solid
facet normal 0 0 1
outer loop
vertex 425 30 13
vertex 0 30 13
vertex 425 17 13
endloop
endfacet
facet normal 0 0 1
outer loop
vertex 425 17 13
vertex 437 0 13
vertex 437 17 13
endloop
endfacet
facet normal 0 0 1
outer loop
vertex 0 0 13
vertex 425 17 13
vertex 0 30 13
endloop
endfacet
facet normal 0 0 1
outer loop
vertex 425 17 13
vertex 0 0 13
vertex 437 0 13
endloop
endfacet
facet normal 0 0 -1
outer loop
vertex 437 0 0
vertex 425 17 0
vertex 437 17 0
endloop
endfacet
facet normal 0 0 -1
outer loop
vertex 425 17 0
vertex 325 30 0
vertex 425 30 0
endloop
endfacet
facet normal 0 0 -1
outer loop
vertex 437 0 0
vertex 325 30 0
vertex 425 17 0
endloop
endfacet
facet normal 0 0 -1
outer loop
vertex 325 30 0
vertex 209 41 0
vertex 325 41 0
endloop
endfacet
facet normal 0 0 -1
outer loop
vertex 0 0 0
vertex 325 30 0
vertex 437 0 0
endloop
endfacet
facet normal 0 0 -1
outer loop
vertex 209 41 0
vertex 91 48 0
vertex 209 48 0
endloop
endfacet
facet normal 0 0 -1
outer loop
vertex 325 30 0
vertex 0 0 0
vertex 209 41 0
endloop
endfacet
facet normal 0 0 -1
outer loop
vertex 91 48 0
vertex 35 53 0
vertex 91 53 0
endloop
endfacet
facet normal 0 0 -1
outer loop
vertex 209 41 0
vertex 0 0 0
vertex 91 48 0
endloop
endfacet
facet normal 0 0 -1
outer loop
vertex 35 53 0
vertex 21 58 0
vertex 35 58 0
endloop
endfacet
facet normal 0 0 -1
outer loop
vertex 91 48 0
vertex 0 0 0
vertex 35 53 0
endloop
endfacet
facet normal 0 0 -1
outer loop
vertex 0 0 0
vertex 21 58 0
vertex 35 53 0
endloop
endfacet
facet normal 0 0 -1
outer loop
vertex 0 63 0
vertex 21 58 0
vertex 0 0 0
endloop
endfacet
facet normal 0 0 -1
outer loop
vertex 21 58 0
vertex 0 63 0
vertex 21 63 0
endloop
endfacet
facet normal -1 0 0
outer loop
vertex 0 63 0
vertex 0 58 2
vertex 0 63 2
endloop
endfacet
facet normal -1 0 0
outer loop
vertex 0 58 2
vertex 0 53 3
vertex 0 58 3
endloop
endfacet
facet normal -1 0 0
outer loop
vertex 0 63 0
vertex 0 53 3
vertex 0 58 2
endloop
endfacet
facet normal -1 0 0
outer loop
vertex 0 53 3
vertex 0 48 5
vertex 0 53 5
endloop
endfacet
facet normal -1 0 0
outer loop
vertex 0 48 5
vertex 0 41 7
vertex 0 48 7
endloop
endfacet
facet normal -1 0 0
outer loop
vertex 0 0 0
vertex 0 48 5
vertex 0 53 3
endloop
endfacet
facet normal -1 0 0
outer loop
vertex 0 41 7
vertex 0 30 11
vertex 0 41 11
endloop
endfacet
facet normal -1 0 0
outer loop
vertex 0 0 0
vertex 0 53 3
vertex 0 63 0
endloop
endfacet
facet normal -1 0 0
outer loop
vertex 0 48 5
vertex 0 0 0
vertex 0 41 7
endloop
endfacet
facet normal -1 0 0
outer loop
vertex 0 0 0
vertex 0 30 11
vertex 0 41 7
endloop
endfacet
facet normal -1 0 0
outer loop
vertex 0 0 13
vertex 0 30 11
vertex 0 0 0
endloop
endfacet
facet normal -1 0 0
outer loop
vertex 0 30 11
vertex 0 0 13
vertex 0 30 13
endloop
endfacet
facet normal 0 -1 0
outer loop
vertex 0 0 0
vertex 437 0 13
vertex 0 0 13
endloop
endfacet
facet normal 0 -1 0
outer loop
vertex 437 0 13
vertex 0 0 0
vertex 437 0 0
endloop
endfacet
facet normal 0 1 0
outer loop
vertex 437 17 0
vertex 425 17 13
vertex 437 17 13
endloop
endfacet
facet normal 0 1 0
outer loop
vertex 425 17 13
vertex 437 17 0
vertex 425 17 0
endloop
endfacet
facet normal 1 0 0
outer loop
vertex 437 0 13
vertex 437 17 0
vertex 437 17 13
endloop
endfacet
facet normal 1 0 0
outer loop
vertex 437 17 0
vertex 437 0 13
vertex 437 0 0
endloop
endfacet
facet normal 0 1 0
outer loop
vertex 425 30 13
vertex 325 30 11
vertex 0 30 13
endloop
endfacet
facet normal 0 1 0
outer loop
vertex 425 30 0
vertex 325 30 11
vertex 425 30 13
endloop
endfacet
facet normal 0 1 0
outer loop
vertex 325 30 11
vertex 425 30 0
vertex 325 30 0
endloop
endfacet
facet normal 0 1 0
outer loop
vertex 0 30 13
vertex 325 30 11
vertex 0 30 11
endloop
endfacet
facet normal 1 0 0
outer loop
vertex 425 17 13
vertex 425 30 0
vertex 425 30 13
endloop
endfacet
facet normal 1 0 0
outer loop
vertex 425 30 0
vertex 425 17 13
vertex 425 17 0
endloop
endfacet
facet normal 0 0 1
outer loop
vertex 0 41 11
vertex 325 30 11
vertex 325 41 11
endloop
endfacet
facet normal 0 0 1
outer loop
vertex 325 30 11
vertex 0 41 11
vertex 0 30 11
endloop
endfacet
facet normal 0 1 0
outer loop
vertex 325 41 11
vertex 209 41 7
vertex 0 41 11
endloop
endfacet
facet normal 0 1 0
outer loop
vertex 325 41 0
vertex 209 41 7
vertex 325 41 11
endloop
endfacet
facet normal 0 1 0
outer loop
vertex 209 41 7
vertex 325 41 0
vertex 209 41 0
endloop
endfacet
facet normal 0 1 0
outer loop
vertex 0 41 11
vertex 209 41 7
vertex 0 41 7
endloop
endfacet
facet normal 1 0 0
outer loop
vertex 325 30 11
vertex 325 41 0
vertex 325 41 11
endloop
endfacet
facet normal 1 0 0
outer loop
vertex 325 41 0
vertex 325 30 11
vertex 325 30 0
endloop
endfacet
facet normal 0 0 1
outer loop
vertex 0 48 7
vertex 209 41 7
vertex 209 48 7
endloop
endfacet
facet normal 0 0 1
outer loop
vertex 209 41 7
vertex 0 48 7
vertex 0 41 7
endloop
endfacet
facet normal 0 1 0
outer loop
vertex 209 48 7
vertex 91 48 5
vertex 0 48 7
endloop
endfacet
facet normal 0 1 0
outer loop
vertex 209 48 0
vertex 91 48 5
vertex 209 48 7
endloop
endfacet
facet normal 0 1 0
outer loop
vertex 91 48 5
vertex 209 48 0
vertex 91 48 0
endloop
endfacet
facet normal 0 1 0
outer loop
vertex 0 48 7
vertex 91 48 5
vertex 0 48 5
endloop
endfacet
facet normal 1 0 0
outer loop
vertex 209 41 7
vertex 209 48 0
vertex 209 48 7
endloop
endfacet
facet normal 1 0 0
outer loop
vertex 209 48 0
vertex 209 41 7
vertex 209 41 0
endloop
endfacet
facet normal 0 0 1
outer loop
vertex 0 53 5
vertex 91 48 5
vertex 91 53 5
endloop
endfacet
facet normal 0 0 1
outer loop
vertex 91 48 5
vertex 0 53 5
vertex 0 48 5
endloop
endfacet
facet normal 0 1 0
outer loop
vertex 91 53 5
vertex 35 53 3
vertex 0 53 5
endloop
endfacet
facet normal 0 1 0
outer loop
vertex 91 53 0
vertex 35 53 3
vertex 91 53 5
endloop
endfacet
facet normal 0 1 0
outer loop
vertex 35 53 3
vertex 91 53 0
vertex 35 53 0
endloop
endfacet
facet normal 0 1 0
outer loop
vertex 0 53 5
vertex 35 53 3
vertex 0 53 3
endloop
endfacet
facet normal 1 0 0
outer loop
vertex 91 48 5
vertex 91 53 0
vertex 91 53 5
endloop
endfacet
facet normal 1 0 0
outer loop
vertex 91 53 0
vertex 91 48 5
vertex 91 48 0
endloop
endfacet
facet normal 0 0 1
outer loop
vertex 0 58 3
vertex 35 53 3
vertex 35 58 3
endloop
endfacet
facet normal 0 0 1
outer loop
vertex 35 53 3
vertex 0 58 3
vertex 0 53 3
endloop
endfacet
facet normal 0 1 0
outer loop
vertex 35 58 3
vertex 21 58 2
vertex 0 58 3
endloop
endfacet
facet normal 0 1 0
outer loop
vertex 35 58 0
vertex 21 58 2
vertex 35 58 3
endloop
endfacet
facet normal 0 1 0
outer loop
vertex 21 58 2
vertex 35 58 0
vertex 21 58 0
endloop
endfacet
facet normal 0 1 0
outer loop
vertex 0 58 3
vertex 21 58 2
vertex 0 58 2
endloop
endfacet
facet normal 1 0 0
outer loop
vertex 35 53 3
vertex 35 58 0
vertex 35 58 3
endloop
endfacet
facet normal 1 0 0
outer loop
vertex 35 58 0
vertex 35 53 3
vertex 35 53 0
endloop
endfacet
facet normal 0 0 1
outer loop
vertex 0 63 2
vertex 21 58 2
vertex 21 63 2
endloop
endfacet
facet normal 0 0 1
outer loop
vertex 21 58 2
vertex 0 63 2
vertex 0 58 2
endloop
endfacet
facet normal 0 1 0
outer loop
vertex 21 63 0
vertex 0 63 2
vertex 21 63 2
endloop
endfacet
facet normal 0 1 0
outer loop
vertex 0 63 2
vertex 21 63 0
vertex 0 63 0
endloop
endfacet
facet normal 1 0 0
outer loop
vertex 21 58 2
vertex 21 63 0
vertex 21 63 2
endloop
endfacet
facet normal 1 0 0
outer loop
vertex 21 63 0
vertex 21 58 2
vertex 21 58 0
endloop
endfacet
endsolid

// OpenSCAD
translate([9.5, 8.5, 6.5]) color([0.2870883399952252, 0.829940686628406, 0.0555270458896614]) cube([19, 17, 13], center=true);
translate([28.5, 8.5, 6.5]) color([0.035933833430188966, 0.4178660447962945, 0.49183095909626395]) cube([19, 17, 13], center=true);
translate([47.5, 8.5, 6.5]) color([0.8633251831082008, 0.7171887463451895, 0.6735438085995347]) cube([19, 17, 13], center=true);
translate([66.5, 8.5, 6.5]) color([0.15137377239978678, 0.9867059242186832, 0.41114019628748133]) cube([19, 17, 13], center=true);
translate([85.5, 8.5, 6.5]) color([0.6117708643248599, 0.38668300553323576, 0.04703291581184044]) cube([19, 17, 13], center=true);
translate([104.5, 8.5, 6.5]) color([0.4708892090480652, 0.15136775389483625, 0.03246546237394399]) cube([19, 17, 13], center=true);
translate([123.5, 8.5, 6.5]) color([0.6174004236810055, 0.6299662912183356, 0.10529282465636491]) cube([19, 17, 13], center=true);
translate([142.5, 8.5, 6.5]) color([0.5491437662317772, 0.3466679766399683, 0.3834140731648874]) cube([19, 17, 13], center=true);
translate([161.5, 8.5, 6.5]) color([0.7764198986996783, 0.49031967752424566, 0.8812766154122413]) cube([19, 17, 13], center=true);
translate([180.5, 8.5, 6.5]) color([0.6101197429062234, 0.4671884150380703, 0.6323126400553846]) cube([19, 17, 13], center=true);
translate([199.5, 8.5, 6.5]) color([0.3378653798287524, 0.12432379252825243, 0.6825296186925238]) cube([19, 17, 13], center=true);
translate([218.5, 8.5, 6.5]) color([0.622037442746657, 0.7885664913738635, 0.1271091249471088]) cube([19, 17, 13], center=true);
translate([237.5, 8.5, 6.5]) color([0.9117833181295222, 0.799341211421814, 0.9168874080910093]) cube([19, 17, 13], center=true);
translate([256.5, 8.5, 6.5]) color([0.8725347217734669, 0.681006446357057, 0.8102508494373589]) cube([19, 17, 13], center=true);
translate([275.5, 8.5, 6.5]) color([0.5190073092314018, 0.7854891493606652, 0.18912746785718504]) cube([19, 17, 13], center=true);
translate([294.5, 8.5, 6.5]) color([0.7821141063572942, 0.44457960405634067, 0.756616221297365]) cube([19, 17, 13], center=true);
translate([313.5, 8.5, 6.5]) color([0.4554702368121878, 0.7895587282777832, 0.07533958521856021]) cube([19, 17, 13], center=true);
translate([332.5, 8.5, 6.5]) color([0.04464090542441246, 0.9342895823715677, 0.4861651007487351]) cube([19, 17, 13], center=true);
translate([351.5, 8.5, 6.5]) color([0.9010713996489047, 0.9447832518820701, 0.6665111524556335]) cube([19, 17, 13], center=true);
translate([370.5, 8.5, 6.5]) color([0.5717968260934746, 0.21597938410680917, 0.09347621929900818]) cube([19, 17, 13], center=true);
translate([389.5, 8.5, 6.5]) color([0.8193942150822732, 0.8887720676319878, 0.7793957106948857]) cube([19, 17, 13], center=true);
translate([408.5, 8.5, 6.5]) color([0.6985024327316249, 0.42011111607482077, 0.3053115900269564]) cube([19, 17, 13], center=true);
translate([427.5, 8.5, 6.5]) color([0.11344489563770899, 0.425970248072163, 0.5660129742477574]) cube([19, 17, 13], center=true);
translate([8.5, 23.5, 6.5]) color([0.9228805831375125, 0.9357547693309531, 0.41564119654091314]) cube([17, 13, 13], center=true);
translate([25.5, 23.5, 6.5]) color([0.0992109880980957, 0.7738187324714434, 0.7342793416571158]) cube([17, 13, 13], center=true);
translate([42.5, 23.5, 6.5]) color([0.03070084595190614, 0.4467185991338365, 0.6864181042985581]) cube([17, 13, 13], center=true);
translate([59.5, 23.5, 6.5]) color([0.030134234552269934, 0.9192823534016137, 0.9622424865104192]) cube([17, 13, 13], center=true);
translate([76.5, 23.5, 6.5]) color([0.72254277208884, 0.0785385396518038, 0.07032946587635569]) cube([17, 13, 13], center=true);
translate([93.5, 23.5, 6.5]) color([0.3592533148212369, 0.029377507756986443, 0.3478777272843395]) cube([17, 13, 13], center=true);
translate([110.5, 23.5, 6.5]) color([0.009964241312966027, 0.9743235128409679, 0.8190066990688627]) cube([17, 13, 13], center=true);
translate([127.5, 23.5, 6.5]) color([0.07051761147818736, 0.8934350918478603, 0.20797804000401565]) cube([17, 13, 13], center=true);
translate([144.5, 23.5, 6.5]) color([0.20479079826934998, 0.6737591455288341, 0.9382622681625481]) cube([17, 13, 13], center=true);
translate([161.5, 23.5, 6.5]) color([0.12318812122923739, 0.007184567252270457, 0.3691301471700257]) cube([17, 13, 13], center=true);
translate([178.5, 23.5, 6.5]) color([0.024650014436155776, 0.6048482375805311, 0.8591756086192088]) cube([17, 13, 13], center=true);
translate([195.5, 23.5, 6.5]) color([0.1869917024228578, 0.11239103583018406, 0.34444960733861085]) cube([17, 13, 13], center=true);
translate([212.5, 23.5, 6.5]) color([0.9591715206073138, 0.13015769442868408, 0.9665192604669938]) cube([17, 13, 13], center=true);
translate([229.5, 23.5, 6.5]) color([0.36223986994484925, 0.47337040276011155, 0.29263198596497353]) cube([17, 13, 13], center=true);
translate([246.5, 23.5, 6.5]) color([0.9371268442154698, 0.9581478949874975, 0.6359157065077434]) cube([17, 13, 13], center=true);
translate([263.5, 23.5, 6.5]) color([0.18404555017515556, 0.9929517886102871, 0.10258043954691198]) cube([17, 13, 13], center=true);
translate([280.5, 23.5, 6.5]) color([0.5808493815940804, 0.15640306008300875, 0.8976753141502056]) cube([17, 13, 13], center=true);
translate([297.5, 23.5, 6.5]) color([0.9456783914956152, 0.8043902980001079, 0.3158914186681244]) cube([17, 13, 13], center=true);
translate([314.5, 23.5, 6.5]) color([0.2428386899579852, 0.7548584132190378, 0.291059519145354]) cube([17, 13, 13], center=true);
translate([331.5, 23.5, 6.5]) color([0.4197853778540753, 0.04625567690264132, 0.13223381043380655]) cube([17, 13, 13], center=true);
translate([348.5, 23.5, 6.5]) color([0.020549620641776678, 0.0779211200935358, 0.07321114936486084]) cube([17, 13, 13], center=true);
translate([365.5, 23.5, 6.5]) color([0.42023170217414685, 0.5507771776374378, 0.740878819870922]) cube([17, 13, 13], center=true);
translate([382.5, 23.5, 6.5]) color([0.14228347384241602, 0.4221887461694188, 0.6369660374117204]) cube([17, 13, 13], center=true);
translate([399.5, 23.5, 6.5]) color([0.08455569481893255, 0.44481115514620384, 0.3692560392397978]) cube([17, 13, 13], center=true);
translate([416.5, 23.5, 6.5]) color([0.9489319289416618, 0.05785711390101722, 0.40862622118314806]) cube([17, 13, 13], center=true);
translate([6.5, 35.5, 5.5]) color([0.41722547979620506, 0.728180504599678, 0.3206710028745039]) cube([13, 11, 11], center=true);
translate([19.5, 35.5, 5.5]) color([0.20399027594623398, 0.2933116551663051, 0.4708875424493587]) cube([13, 11, 11], center=true);
translate([32.5, 35.5, 5.5]) color([0.9502683295716211, 0.7965170227633064, 0.2769702457797433]) cube([13, 11, 11], center=true);
translate([45.5, 35.5, 5.5]) color([0.5581815883930463, 0.6882003035685332, 0.7956571556821322]) cube([13, 11, 11], center=true);
translate([58.5, 35.5, 5.5]) color([0.4461643839498476, 0.398776905129706, 0.7676407428212785]) cube([13, 11, 11], center=true);
translate([71.5, 35.5, 5.5]) color([0.43171649556411207, 0.2479576688970051, 0.4534470315306477]) cube([13, 11, 11], center=true);
translate([84.5, 35.5, 5.5]) color([0.9371046462904561, 0.14256748821860132, 0.4624353545272121]) cube([13, 11, 11], center=true);
translate([97.5, 35.5, 5.5]) color([0.6373035243637815, 0.48328798826810027, 0.20363990437036994]) cube([13, 11, 11], center=true);
translate([110.5, 35.5, 5.5]) color([0.0018431606156659175, 0.698991711803439, 0.6187355180234525]) cube([13, 11, 11], center=true);
translate([123.5, 35.5, 5.5]) color([0.007776649435864202, 0.2985601210181208, 0.7686342595428415]) cube([13, 11, 11], center=true);
translate([136.5, 35.5, 5.5]) color([0.6289203785446209, 0.5452081159439722, 0.1562211098090489]) cube([13, 11, 11], center=true);
translate([149.5, 35.5, 5.5]) color([0.7062940429996885, 0.4714349217158037, 0.6781787462359636]) cube([13, 11, 11], center=true);
translate([162.5, 35.5, 5.5]) color([0.7600898367234922, 0.23236272144124515, 0.7619950130977117]) cube([13, 11, 11], center=true);
translate([175.5, 35.5, 5.5]) color([0.28008838468838926, 0.9840151371182455, 0.12083161078451865]) cube([13, 11, 11], center=true);
translate([188.5, 35.5, 5.5]) color([0.8837180187440564, 0.040547125043371324, 0.256575818348144]) cube([13, 11, 11], center=true);
translate([201.5, 35.5, 5.5]) color([0.5261019087624684, 0.5816161834445946, 0.3962349850280922]) cube([13, 11, 11], center=true);
translate([214.5, 35.5, 5.5]) color([0.10203172822707107, 0.2526080858247133, 0.28339650386048865]) cube([13, 11, 11], center=true);
translate([227.5, 35.5, 5.5]) color([0.7552228545587315, 0.9087743252220071, 0.5954099154864194]) cube([13, 11, 11], center=true);
translate([240.5, 35.5, 5.5]) color([0.03545096569102746, 0.7922364716417103, 0.30560393283991993]) cube([13, 11, 11], center=true);
translate([253.5, 35.5, 5.5]) color([0.33989040641624346, 0.5301854376454147, 0.24904704757555507]) cube([13, 11, 11], center=true);
translate([266.5, 35.5, 5.5]) color([0.9199780878573697, 0.1635547583408129, 0.41483040050373277]) cube([13, 11, 11], center=true);
translate([279.5, 35.5, 5.5]) color([0.2896919495072058, 0.5198341022016146, 0.5739818030823766]) cube([13, 11, 11], center=true);
translate([292.5, 35.5, 5.5]) color([0.6271396891048426, 0.5313758038379728, 0.4108045023355995]) cube([13, 11, 11], center=true);
translate([305.5, 35.5, 5.5]) color([0.634594012376466, 0.40341287658681757, 0.7785502590540477]) cube([13, 11, 11], center=true);
translate([318.5, 35.5, 5.5]) color([0.7881774252549901, 0.29225416811082217, 0.37180432355577453]) cube([13, 11, 11], center=true);
translate([5.5, 44.5, 3.5]) color([0.6288109059468862, 0.15706996711565713, 0.6970319309869248]) cube([11, 7, 7], center=true);
translate([16.5, 44.5, 3.5]) color([0.3814277529807131, 0.591062474757007, 0.1395330992312218]) cube([11, 7, 7], center=true);
translate([27.5, 44.5, 3.5]) color([0.6682583860975598, 0.3540578606136997, 0.4726655762072315]) cube([11, 7, 7], center=true);
translate([38.5, 44.5, 3.5]) color([0.4151074008495357, 0.47671524799509457, 0.6946956329164442]) cube([11, 7, 7], center=true);
translate([49.5, 44.5, 3.5]) color([0.31824017683207795, 0.6520544808985483, 0.060222107499701916]) cube([11, 7, 7], center=true);
translate([60.5, 44.5, 3.5]) color([0.3001851524622099, 0.7452096901500458, 0.05240587806206365]) cube([11, 7, 7], center=true);
translate([71.5, 44.5, 3.5]) color([0.6211421952822352, 0.025546799267838538, 0.4715288683099005]) cube([11, 7, 7], center=true);
translate([82.5, 44.5, 3.5]) color([0.8885450437134765, 0.010110093997603875, 0.5268280206539229]) cube([11, 7, 7], center=true);
translate([93.5, 44.5, 3.5]) color([0.06645682965886301, 0.8671097761494883, 0.6862965222396646]) cube([11, 7, 7], center=true);
translate([104.5, 44.5, 3.5]) color([0.7419538566814291, 0.669007579945888, 0.006423453698145676]) cube([11, 7, 7], center=true);
translate([115.5, 44.5, 3.5]) color([0.041177862257898545, 0.6208768040220466, 0.9996851255769114]) cube([11, 7, 7], center=true);
translate([126.5, 44.5, 3.5]) color([0.8731472390917929, 0.699685806725371, 0.7270999543422898]) cube([11, 7, 7], center=true);
translate([137.5, 44.5, 3.5]) color([0.2266870226016624, 0.751613934135812, 0.28792410486343756]) cube([11, 7, 7], center=true);
translate([148.5, 44.5, 3.5]) color([0.10546026702239297, 0.4608948954667579, 0.33019577252961807]) cube([11, 7, 7], center=true);
translate([159.5, 44.5, 3.5]) color([0.168255398651179, 0.42170989251140467, 0.8972009769638755]) cube([11, 7, 7], center=true);
translate([170.5, 44.5, 3.5]) color([0.4352702732981688, 0.4472918952497248, 0.708827757444238]) cube([11, 7, 7], center=true);
translate([181.5, 44.5, 3.5]) color([0.5241618701522923, 0.12922303534199353, 0.91039239754397]) cube([11, 7, 7], center=true);
translate([192.5, 44.5, 3.5]) color([0.4441243361619651, 0.7893377392253591, 0.38887513002224416]) cube([11, 7, 7], center=true);
translate([203.5, 44.5, 3.5]) color([0.806846018820692, 0.3895364160074527, 0.2201595216660458]) cube([11, 7, 7], center=true);
translate([3.5, 50.5, 2.5]) color([0.19619466691666865, 0.9400346443375104, 0.58653025858102]) cube([7, 5, 5], center=true);
translate([10.5, 50.5, 2.5]) color([0.04979326505826487, 0.38834759617804915, 0.234029260524927]) cube([7, 5, 5], center=true);
translate([17.5, 50.5, 2.5]) color([0.08465706460929934, 0.18675586852140846, 0.05699047999950346]) cube([7, 5, 5], center=true);
translate([24.5, 50.5, 2.5]) color([0.6380736282281027, 0.17337386483746886, 0.6107798762435255]) cube([7, 5, 5], center=true);
translate([31.5, 50.5, 2.5]) color([0.6125067478912297, 0.7049237107399368, 0.5121186506114312]) cube([7, 5, 5], center=true);
translate([38.5, 50.5, 2.5]) color([0.28442399033479826, 0.8774574539285279, 0.35307108172351365]) cube([7, 5, 5], center=true);
translate([45.5, 50.5, 2.5]) color([0.4582943249787391, 0.6318794317305464, 0.5161242981674495]) cube([7, 5, 5], center=true);
translate([52.5, 50.5, 2.5]) color([0.9564683485665337, 0.9547176774381221, 0.9297598506094263]) cube([7, 5, 5], center=true);
translate([59.5, 50.5, 2.5]) color([0.9340763496652581, 0.580960135568696, 0.49020206373000297]) cube([7, 5, 5], center=true);
translate([66.5, 50.5, 2.5]) color([0.7041168173823689, 0.21541959298546798, 0.26587203921552827]) cube([7, 5, 5], center=true);
translate([73.5, 50.5, 2.5]) color([0.04380725363309168, 0.16285754255803098, 0.0038745499388105342]) cube([7, 5, 5], center=true);
translate([80.5, 50.5, 2.5]) color([0.6546275765234981, 0.14040698903568194, 0.7866793455760521]) cube([7, 5, 5], center=true);
translate([87.5, 50.5, 2.5]) color([0.680503995881725, 0.9706757933544957, 0.3965144869518913]) cube([7, 5, 5], center=true);
translate([2.5, 55.5, 1.5]) color([0.9213919134510528, 0.4537041723195332, 0.3395037398362071]) cube([5, 5, 3], center=true);
translate([7.5, 55.5, 1.5]) color([0.10233886991705377, 0.8828321850718597, 0.7947901585625868]) cube([5, 5, 3], center=true);
translate([12.5, 55.5, 1.5]) color([0.3229289765350606, 0.45574438492562896, 0.32514346581324827]) cube([5, 5, 3], center=true);
translate([17.5, 55.5, 1.5]) color([0.028829116538094723, 0.04435252539911694, 0.3687041258820589]) cube([5, 5, 3], center=true);
translate([22.5, 55.5, 1.5]) color([0.20959132812878367, 0.5245146032105923, 0.1877850356496189]) cube([5, 5, 3], center=true);
translate([27.5, 55.5, 1.5]) color([0.2016215864664097, 0.6726678813176303, 0.7356026567617159]) cube([5, 5, 3], center=true);
translate([32.5, 55.5, 1.5]) color([0.31223209587410494, 0.8599943994333726, 0.2546391746557106]) cube([5, 5, 3], center=true);
translate([1.5, 60.5, 1.0]) color([0.34394037628155716, 0.712480390369609, 0.04450290132920964]) cube([3, 5, 2], center=true);
translate([4.5, 60.5, 1.0]) color([0.934183460116191, 0.07233773178762537, 0.4609310589380602]) cube([3, 5, 2], center=true);
translate([7.5, 60.5, 1.0]) color([0.7246048259600892, 0.04746853498479808, 0.8090026856371774]) cube([3, 5, 2], center=true);
translate([10.5, 60.5, 1.0]) color([0.9788933433114139, 0.460511672795628, 0.11812363628756806]) cube([3, 5, 2], center=true);
translate([13.5, 60.5, 1.0]) color([0.08147699565547994, 0.09873043616313526, 0.7654413741364753]) cube([3, 5, 2], center=true);
translate([16.5, 60.5, 1.0]) color([0.4140128484685186, 0.9192341581990311, 0.4406397760864845]) cube([3, 5, 2], center=true);
translate([19.5, 60.5, 1.0]) color([0.07714331014460807, 0.42693558751800065, 0.7548278934255565]) cube([3, 5, 2], center=true);
